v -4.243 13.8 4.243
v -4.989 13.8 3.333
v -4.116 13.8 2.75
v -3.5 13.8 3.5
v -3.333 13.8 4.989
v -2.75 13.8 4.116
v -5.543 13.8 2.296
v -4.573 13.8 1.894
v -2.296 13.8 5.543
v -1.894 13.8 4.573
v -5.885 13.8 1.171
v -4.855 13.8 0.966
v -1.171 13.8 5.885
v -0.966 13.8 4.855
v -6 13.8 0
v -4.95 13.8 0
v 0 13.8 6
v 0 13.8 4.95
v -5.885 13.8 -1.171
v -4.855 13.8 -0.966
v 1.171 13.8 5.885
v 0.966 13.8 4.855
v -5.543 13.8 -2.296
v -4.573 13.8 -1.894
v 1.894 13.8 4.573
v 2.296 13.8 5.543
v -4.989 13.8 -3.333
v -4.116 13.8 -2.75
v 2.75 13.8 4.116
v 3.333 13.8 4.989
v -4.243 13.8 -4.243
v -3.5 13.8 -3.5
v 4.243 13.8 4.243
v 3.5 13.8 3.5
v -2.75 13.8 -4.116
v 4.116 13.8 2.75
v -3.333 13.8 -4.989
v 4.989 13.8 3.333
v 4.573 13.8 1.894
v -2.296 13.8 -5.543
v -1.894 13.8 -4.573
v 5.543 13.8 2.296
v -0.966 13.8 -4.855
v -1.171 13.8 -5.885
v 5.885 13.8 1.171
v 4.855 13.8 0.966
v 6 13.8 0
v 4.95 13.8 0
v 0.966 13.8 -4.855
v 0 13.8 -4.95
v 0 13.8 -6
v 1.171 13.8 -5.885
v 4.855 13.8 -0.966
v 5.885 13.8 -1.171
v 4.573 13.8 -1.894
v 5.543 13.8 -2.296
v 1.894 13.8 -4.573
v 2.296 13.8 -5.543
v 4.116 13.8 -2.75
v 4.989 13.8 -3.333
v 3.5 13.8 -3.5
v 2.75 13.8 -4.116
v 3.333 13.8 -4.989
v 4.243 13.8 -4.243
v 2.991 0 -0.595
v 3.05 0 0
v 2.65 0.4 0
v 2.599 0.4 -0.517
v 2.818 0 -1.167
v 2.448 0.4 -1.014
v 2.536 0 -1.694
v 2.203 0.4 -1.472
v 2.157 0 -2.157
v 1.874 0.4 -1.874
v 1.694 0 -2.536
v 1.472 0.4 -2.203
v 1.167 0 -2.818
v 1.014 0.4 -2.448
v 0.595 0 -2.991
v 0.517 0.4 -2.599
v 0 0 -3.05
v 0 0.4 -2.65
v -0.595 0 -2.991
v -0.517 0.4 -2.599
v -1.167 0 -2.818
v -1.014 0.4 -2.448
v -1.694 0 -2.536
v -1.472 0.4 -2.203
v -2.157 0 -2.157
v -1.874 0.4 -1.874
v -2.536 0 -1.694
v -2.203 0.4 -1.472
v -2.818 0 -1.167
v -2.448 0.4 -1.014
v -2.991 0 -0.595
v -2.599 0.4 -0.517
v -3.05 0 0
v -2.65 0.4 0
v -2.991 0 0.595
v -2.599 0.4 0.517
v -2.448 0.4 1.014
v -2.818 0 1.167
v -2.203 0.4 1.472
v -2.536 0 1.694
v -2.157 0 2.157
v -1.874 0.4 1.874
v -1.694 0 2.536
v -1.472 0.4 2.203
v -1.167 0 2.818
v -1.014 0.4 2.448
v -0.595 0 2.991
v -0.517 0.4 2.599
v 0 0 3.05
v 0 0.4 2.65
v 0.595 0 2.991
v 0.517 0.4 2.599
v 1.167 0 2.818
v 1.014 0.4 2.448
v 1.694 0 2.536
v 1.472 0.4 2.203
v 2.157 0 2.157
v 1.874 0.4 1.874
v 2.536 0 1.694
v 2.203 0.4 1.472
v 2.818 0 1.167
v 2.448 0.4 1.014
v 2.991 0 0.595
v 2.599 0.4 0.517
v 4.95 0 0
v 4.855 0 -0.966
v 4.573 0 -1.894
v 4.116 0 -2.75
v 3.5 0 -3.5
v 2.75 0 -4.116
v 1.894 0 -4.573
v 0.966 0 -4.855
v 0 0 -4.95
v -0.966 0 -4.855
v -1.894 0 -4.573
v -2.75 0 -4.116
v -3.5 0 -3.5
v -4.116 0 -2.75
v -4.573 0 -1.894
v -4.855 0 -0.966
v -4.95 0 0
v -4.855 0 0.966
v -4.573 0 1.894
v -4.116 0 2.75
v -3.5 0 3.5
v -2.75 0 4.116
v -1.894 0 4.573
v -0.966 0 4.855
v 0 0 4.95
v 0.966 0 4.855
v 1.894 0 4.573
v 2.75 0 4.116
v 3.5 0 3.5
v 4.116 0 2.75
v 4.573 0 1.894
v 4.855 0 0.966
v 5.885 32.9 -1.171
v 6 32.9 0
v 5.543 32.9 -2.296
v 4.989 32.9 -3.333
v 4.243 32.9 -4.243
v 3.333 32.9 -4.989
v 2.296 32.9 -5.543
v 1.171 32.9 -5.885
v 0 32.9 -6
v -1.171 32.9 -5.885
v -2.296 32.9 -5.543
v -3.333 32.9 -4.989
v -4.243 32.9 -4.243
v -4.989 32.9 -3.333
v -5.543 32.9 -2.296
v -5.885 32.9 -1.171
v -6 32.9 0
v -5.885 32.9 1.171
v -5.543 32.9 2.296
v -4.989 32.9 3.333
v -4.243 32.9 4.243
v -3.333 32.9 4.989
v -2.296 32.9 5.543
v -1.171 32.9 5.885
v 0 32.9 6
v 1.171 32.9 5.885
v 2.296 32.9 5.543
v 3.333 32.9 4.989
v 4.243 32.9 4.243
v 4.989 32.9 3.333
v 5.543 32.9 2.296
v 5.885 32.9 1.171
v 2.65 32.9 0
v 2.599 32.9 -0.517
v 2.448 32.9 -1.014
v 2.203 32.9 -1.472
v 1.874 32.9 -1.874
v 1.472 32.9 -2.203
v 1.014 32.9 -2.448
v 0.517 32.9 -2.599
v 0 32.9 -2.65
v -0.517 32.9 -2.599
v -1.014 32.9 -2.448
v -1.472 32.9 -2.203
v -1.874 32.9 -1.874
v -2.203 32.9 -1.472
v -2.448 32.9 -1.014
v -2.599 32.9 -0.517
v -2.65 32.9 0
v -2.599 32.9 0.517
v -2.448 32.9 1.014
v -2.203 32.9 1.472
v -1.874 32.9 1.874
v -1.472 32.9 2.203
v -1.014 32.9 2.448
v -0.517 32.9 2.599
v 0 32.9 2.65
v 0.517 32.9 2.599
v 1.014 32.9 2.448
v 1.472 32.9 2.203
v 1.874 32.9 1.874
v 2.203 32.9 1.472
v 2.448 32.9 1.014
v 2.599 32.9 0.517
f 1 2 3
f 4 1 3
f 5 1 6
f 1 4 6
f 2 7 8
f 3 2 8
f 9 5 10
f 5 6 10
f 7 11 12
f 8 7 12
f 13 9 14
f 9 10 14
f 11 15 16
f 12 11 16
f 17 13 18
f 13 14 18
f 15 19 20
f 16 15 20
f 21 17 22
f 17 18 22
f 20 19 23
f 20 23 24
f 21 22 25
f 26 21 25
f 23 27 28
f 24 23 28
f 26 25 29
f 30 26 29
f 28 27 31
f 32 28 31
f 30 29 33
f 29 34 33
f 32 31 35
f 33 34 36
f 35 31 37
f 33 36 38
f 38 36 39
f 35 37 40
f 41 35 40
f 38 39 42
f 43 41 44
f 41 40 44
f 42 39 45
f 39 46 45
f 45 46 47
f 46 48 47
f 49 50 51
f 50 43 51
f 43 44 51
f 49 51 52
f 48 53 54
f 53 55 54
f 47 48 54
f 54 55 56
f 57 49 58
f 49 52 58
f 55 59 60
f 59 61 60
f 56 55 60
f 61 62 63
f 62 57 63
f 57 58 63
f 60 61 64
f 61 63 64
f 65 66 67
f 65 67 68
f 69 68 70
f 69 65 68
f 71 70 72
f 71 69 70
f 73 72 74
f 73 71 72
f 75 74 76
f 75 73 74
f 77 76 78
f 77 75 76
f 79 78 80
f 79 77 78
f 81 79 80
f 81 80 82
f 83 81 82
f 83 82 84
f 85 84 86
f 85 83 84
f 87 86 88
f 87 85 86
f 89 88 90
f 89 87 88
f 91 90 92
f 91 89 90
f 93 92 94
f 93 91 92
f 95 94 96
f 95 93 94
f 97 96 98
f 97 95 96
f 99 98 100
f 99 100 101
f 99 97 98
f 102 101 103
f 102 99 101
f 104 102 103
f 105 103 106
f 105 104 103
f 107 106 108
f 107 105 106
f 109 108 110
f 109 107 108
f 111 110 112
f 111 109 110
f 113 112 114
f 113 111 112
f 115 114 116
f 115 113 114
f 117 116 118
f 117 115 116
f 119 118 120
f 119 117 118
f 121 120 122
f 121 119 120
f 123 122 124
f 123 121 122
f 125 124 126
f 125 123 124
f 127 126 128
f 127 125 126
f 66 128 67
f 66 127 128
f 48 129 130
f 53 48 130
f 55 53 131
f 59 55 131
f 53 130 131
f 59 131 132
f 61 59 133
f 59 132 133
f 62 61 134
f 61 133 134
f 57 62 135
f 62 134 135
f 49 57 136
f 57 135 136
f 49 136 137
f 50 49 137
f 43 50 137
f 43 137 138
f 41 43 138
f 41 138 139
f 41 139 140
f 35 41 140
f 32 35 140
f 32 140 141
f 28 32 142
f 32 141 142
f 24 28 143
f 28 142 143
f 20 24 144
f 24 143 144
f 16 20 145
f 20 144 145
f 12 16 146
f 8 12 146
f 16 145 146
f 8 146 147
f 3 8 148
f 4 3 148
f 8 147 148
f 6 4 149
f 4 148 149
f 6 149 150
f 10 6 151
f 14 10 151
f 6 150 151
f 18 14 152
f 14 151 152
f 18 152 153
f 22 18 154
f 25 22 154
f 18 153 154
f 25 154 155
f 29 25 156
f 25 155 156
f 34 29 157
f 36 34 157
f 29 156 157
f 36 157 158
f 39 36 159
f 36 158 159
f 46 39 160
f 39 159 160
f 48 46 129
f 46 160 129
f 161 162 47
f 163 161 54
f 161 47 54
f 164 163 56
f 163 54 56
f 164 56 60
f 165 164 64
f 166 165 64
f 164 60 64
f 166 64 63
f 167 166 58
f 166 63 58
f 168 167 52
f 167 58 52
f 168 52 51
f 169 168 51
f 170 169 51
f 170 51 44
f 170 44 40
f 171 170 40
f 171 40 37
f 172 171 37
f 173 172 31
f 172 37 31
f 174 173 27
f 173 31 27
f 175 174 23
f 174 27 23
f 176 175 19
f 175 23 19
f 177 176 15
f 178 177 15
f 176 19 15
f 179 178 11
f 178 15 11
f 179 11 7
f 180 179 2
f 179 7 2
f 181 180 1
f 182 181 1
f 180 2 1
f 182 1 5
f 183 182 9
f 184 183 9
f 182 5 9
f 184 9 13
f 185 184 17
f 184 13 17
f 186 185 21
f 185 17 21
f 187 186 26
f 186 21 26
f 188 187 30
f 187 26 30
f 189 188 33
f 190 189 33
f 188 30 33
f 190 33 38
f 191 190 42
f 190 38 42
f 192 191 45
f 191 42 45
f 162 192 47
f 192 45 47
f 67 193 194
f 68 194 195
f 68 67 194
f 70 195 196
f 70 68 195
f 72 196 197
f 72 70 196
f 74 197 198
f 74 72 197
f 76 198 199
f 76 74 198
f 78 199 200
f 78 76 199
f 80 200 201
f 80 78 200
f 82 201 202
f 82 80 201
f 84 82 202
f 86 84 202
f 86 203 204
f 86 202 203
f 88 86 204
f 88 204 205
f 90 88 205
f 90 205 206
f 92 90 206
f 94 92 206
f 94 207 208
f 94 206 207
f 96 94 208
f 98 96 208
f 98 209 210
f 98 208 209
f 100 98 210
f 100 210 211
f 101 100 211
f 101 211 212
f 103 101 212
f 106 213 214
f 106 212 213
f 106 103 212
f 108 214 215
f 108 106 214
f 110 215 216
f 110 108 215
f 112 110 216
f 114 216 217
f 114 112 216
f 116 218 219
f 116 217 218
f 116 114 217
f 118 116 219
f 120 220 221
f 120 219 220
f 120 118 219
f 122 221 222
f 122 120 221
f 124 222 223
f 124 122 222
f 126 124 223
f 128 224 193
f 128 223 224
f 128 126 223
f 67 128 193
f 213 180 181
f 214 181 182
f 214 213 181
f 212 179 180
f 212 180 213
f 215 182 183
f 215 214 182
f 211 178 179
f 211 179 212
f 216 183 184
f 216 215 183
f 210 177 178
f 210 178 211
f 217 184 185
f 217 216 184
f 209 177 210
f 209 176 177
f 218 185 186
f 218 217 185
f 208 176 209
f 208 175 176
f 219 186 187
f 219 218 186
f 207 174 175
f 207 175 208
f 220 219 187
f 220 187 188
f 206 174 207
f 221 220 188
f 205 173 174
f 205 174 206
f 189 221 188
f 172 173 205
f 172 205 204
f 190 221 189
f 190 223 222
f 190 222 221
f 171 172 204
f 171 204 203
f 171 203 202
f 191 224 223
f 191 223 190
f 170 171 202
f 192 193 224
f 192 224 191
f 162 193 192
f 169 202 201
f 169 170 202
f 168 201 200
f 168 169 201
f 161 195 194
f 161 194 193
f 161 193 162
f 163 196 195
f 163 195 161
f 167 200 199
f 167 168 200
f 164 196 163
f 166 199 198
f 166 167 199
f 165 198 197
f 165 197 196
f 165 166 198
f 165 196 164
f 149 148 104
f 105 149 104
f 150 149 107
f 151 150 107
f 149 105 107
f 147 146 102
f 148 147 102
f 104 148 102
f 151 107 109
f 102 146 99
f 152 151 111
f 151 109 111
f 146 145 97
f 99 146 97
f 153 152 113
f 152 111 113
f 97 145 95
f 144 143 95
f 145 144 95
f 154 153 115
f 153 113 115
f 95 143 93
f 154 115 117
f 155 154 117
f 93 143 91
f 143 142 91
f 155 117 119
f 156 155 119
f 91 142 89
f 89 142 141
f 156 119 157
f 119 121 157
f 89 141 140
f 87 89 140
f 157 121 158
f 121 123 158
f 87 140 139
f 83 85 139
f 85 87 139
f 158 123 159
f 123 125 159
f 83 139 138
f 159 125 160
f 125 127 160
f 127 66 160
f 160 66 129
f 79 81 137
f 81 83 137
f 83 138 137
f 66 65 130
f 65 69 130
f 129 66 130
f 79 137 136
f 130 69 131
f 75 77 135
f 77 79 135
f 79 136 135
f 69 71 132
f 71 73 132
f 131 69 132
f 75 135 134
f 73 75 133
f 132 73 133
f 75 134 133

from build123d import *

# Parameters (mm, degrees)
SKETCH1_R           = 4.95
BOSS_EXTRUDE1_DEPTH = 13.8
SKETCH2_R           = 6
BOSS_EXTRUDE2_DEPTH = 19.1
SKETCH7_R           = 2.65
CUT_EXTRUDE1_DEPTH  = 33.9
CHAMFER1_SIZE       = 0.4


with BuildPart() as part:
    # Sketch1 → Boss-Extrude1 (new body)
    with BuildSketch(Plane(origin=(0, 0, 0), x_dir=(1, 0, 0), z_dir=(0, 1, 0))):
        Circle(SKETCH1_R)
    extrude(amount=BOSS_EXTRUDE1_DEPTH)

    # Sketch2 → Boss-Extrude2 (add)
    with BuildSketch(Plane(origin=(0, 13.8, 0), x_dir=(1, 0, 0), z_dir=(0, 1, 0))):
        Circle(SKETCH2_R)
    extrude(amount=BOSS_EXTRUDE2_DEPTH)

    # Sketch7 → Cut-Extrude1 (cut, through all)
    with BuildSketch(Plane(origin=(0, 0, 0), x_dir=(1, 0, 0), z_dir=(0, 1, 0))):
        Circle(SKETCH7_R)
    extrude(amount=CUT_EXTRUDE1_DEPTH, mode=Mode.SUBTRACT)

    # Chamfer1
    chamfer1_edges = [part.edges().sort_by_distance(p)[0] for p in [
        (-2.65, 0, 0),
    ]]
    chamfer(chamfer1_edges, length=CHAMFER1_SIZE)


solid = part.part
